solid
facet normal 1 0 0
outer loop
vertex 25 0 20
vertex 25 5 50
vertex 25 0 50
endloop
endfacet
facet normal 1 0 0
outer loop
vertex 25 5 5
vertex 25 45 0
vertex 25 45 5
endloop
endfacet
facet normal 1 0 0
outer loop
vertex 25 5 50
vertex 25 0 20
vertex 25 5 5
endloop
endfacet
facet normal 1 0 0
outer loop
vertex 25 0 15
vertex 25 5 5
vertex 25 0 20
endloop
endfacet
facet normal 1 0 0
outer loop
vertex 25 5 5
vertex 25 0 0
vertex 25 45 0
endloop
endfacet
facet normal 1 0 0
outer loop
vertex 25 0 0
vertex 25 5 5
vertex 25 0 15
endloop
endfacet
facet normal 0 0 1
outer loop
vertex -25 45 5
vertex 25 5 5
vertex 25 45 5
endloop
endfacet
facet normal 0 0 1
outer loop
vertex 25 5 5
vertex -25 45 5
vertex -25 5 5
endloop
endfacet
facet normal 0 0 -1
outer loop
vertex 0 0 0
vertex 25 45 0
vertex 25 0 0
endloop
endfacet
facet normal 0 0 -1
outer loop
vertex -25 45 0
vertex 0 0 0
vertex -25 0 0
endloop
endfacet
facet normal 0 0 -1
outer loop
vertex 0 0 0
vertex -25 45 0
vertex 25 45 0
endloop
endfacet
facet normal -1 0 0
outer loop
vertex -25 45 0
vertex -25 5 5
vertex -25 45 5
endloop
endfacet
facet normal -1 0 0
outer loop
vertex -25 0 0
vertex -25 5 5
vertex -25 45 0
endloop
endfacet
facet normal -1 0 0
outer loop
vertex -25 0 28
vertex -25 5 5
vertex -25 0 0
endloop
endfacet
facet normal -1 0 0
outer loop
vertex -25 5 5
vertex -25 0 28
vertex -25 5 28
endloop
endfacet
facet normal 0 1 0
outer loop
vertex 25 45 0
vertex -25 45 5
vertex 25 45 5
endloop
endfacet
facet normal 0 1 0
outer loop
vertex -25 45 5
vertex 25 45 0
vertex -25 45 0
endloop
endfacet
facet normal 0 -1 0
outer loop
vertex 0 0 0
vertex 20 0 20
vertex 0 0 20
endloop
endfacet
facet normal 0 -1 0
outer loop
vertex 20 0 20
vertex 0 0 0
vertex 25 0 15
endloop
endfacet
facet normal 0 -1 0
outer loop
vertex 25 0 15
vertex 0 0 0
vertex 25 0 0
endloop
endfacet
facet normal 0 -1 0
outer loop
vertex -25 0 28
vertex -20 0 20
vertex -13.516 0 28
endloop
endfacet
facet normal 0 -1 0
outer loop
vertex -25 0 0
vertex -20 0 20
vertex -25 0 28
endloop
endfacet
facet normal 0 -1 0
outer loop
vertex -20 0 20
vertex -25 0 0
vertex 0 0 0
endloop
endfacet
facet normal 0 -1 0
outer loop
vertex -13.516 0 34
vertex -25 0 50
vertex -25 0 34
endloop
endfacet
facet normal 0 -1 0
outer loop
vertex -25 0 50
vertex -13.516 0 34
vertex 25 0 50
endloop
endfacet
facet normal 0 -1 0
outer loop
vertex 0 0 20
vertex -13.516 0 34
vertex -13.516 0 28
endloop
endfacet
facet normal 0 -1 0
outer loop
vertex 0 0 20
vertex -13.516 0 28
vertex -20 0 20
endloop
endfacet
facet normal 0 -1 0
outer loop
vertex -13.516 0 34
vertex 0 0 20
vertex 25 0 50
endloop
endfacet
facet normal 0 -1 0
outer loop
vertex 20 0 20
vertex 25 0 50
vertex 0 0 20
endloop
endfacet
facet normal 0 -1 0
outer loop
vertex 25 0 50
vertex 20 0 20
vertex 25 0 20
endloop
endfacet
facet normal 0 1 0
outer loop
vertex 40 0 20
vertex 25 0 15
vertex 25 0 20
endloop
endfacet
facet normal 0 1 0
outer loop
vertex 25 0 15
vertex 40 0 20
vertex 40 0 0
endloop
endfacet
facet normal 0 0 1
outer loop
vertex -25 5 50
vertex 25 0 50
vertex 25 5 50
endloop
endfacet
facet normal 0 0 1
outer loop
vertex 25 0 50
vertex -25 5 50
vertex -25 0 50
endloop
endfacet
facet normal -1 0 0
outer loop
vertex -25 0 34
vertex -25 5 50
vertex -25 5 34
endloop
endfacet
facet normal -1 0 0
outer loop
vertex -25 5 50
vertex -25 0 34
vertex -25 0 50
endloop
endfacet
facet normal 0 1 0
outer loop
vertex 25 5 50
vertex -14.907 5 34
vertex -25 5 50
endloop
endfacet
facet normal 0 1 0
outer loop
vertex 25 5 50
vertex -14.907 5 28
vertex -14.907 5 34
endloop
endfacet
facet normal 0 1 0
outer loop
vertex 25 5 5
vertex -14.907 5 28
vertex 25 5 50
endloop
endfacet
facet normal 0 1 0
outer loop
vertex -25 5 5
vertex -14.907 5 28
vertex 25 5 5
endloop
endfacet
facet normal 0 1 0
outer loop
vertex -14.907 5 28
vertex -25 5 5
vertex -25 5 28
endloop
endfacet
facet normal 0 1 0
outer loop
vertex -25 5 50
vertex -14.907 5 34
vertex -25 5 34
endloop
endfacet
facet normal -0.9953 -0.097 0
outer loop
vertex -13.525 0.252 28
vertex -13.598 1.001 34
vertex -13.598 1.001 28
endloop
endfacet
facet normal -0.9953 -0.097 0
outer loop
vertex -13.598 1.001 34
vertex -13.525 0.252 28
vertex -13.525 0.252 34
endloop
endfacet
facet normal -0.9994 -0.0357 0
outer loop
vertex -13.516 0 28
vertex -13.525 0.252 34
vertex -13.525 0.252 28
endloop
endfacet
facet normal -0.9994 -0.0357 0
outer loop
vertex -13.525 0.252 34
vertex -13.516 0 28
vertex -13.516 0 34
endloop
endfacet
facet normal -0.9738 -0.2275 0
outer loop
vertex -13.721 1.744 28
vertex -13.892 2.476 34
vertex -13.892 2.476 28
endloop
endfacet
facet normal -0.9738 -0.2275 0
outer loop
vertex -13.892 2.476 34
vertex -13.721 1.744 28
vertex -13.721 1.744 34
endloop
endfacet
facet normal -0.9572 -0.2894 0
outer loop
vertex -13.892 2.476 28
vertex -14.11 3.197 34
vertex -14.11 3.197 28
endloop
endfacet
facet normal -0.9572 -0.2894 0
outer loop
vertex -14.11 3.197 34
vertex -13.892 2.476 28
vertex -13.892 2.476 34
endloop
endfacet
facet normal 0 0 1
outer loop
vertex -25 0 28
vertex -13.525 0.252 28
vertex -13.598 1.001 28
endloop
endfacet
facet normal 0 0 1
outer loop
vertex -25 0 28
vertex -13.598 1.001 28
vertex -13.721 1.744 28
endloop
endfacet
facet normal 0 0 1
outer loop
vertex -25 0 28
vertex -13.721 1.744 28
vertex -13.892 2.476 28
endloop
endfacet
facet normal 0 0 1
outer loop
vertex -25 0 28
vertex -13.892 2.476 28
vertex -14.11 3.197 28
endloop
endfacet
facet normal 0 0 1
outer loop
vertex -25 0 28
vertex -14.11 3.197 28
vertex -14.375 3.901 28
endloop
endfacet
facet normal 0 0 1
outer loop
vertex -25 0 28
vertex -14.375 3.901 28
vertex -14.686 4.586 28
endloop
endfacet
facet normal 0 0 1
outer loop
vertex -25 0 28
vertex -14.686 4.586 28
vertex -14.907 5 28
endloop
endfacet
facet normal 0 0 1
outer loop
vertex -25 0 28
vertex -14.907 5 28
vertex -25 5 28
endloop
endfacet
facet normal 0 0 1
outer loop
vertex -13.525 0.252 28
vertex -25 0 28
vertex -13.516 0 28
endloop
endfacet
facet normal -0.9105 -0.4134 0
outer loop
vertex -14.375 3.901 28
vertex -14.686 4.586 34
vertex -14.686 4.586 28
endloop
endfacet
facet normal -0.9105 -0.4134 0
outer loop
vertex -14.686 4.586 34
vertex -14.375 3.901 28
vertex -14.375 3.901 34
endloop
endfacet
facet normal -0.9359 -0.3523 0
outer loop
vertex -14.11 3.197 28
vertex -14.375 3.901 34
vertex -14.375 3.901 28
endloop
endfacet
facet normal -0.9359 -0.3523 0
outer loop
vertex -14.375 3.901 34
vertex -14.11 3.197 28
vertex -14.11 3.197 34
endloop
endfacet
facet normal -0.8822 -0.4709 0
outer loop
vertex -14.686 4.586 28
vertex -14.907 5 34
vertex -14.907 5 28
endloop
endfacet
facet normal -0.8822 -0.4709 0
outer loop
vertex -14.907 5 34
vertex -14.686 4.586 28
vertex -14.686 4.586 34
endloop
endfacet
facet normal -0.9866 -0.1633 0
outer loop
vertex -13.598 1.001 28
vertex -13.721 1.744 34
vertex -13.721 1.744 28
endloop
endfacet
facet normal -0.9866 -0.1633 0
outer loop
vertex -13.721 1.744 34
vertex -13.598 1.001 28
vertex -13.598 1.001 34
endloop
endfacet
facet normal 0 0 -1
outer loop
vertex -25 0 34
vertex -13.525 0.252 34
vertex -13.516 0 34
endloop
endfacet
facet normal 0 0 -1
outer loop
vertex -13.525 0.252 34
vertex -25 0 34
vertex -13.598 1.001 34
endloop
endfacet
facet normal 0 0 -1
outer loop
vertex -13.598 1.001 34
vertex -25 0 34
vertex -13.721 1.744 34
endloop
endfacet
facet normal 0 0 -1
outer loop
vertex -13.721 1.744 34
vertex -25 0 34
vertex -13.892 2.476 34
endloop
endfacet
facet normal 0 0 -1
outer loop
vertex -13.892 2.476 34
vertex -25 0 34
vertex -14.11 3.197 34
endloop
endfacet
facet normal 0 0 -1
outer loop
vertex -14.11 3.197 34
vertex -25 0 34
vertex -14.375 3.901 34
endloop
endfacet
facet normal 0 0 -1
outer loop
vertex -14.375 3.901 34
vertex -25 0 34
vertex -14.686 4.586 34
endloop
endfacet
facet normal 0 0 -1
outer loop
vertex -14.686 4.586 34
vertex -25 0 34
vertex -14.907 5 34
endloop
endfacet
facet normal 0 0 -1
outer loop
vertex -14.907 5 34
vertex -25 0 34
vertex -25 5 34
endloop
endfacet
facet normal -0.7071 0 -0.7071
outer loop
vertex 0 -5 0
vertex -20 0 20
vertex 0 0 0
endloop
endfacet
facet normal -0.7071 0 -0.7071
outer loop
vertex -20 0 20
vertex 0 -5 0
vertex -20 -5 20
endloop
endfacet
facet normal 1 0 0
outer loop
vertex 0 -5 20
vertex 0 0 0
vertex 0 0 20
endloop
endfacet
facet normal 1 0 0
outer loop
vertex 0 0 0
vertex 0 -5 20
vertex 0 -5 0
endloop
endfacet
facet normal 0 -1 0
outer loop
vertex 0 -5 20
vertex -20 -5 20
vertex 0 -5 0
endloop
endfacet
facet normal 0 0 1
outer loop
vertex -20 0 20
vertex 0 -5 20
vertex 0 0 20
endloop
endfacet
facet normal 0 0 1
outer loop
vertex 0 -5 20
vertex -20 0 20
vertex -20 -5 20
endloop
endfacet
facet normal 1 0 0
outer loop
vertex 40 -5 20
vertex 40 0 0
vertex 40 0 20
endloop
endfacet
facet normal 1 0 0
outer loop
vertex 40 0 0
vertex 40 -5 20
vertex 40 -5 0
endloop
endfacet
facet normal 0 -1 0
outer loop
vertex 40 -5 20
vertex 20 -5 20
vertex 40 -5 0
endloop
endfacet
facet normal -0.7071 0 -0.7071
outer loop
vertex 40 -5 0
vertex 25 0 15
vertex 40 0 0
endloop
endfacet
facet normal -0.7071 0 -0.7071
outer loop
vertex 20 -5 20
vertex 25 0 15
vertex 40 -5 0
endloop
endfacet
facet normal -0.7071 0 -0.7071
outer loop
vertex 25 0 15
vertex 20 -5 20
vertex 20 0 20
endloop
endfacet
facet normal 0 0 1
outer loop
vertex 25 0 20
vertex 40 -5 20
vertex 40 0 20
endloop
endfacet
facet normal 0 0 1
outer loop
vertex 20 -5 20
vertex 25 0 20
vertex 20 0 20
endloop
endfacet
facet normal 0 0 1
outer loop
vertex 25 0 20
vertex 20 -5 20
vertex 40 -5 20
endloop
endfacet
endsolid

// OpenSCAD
// L-shaped mounting bracket for NEMA 17 stepper motor (syringe pump)
// Print orientation: base plate on bed, vertical plate builds upward (+Z)

// ---------------- Parameters ----------------
base_w      = 50;    // base plate length (X)
base_h      = 45;    // base plate width (Y)
base_t      = 5;     // base plate thickness (Z)

hole_m4_x   = -17;   // M4 hole X offset from centre
hole_m4_y   = 30;    // M4 hole Y position

plate_w     = 50;    // motor plate length (X)
plate_h     = 5;     // motor plate width (Y)
plate_z     = 50;    // motor plate height (Z)

boss_d      = 23;    // motor boss hole diameter
boss_x      = 0;     // boss hole X centre
boss_z      = 28;    // boss hole Z centre

screw_d     = 3.4;   // M3 screw hole diameter
screw_pitch = 31;    // square pattern side length

gusset_t    = 5;     // gusset thickness (X)
gusset_leg  = 20;    // gusset leg length (Y and Z)

eps         = 0.5;   // cutter overshoot

$fn = 96;

// ---------------- Model ----------------
union() {
    // Base plate
    translate([-base_w/2, 0, 0])
        difference() {
            cube([base_w, base_h, base_t]);
            for (sx = [-1, 1])
                translate([sx * hole_m4_x, hole_m4_y, -eps])
                    cylinder(d = hole_m4_x, h = base_t + 2*eps);
        }

    // Motor plate
    translate([-plate_w/2, 0, 0])
        difference() {
            cube([plate_w, plate_h, plate_z]);
            translate([boss_x, -eps, boss_z])
                cylinder(d = boss_d, h = plate_h + 2*eps);
            for (i = [0 : 3])
                for (j = [0 : 3])
                    translate([(i - 1.5) * screw_pitch, (j - 1.5) * screw_pitch, -eps])
                        cylinder(d = screw_d, h = plate_z + 2*eps);
        }

    // Gussets
    for (x0 = [-base_w/2 + gusset_t, base_w/2 - gusset_t])
        translate([x0, 0, 0])
            rotate([90, 0, 0])
                linear_extrude(height = gusset_t)
                    polygon(points = [
                        [gusset_leg, gusset_leg],
                        [gusset_leg, 0],
                        [0, gusset_leg]
                    ]);
}
